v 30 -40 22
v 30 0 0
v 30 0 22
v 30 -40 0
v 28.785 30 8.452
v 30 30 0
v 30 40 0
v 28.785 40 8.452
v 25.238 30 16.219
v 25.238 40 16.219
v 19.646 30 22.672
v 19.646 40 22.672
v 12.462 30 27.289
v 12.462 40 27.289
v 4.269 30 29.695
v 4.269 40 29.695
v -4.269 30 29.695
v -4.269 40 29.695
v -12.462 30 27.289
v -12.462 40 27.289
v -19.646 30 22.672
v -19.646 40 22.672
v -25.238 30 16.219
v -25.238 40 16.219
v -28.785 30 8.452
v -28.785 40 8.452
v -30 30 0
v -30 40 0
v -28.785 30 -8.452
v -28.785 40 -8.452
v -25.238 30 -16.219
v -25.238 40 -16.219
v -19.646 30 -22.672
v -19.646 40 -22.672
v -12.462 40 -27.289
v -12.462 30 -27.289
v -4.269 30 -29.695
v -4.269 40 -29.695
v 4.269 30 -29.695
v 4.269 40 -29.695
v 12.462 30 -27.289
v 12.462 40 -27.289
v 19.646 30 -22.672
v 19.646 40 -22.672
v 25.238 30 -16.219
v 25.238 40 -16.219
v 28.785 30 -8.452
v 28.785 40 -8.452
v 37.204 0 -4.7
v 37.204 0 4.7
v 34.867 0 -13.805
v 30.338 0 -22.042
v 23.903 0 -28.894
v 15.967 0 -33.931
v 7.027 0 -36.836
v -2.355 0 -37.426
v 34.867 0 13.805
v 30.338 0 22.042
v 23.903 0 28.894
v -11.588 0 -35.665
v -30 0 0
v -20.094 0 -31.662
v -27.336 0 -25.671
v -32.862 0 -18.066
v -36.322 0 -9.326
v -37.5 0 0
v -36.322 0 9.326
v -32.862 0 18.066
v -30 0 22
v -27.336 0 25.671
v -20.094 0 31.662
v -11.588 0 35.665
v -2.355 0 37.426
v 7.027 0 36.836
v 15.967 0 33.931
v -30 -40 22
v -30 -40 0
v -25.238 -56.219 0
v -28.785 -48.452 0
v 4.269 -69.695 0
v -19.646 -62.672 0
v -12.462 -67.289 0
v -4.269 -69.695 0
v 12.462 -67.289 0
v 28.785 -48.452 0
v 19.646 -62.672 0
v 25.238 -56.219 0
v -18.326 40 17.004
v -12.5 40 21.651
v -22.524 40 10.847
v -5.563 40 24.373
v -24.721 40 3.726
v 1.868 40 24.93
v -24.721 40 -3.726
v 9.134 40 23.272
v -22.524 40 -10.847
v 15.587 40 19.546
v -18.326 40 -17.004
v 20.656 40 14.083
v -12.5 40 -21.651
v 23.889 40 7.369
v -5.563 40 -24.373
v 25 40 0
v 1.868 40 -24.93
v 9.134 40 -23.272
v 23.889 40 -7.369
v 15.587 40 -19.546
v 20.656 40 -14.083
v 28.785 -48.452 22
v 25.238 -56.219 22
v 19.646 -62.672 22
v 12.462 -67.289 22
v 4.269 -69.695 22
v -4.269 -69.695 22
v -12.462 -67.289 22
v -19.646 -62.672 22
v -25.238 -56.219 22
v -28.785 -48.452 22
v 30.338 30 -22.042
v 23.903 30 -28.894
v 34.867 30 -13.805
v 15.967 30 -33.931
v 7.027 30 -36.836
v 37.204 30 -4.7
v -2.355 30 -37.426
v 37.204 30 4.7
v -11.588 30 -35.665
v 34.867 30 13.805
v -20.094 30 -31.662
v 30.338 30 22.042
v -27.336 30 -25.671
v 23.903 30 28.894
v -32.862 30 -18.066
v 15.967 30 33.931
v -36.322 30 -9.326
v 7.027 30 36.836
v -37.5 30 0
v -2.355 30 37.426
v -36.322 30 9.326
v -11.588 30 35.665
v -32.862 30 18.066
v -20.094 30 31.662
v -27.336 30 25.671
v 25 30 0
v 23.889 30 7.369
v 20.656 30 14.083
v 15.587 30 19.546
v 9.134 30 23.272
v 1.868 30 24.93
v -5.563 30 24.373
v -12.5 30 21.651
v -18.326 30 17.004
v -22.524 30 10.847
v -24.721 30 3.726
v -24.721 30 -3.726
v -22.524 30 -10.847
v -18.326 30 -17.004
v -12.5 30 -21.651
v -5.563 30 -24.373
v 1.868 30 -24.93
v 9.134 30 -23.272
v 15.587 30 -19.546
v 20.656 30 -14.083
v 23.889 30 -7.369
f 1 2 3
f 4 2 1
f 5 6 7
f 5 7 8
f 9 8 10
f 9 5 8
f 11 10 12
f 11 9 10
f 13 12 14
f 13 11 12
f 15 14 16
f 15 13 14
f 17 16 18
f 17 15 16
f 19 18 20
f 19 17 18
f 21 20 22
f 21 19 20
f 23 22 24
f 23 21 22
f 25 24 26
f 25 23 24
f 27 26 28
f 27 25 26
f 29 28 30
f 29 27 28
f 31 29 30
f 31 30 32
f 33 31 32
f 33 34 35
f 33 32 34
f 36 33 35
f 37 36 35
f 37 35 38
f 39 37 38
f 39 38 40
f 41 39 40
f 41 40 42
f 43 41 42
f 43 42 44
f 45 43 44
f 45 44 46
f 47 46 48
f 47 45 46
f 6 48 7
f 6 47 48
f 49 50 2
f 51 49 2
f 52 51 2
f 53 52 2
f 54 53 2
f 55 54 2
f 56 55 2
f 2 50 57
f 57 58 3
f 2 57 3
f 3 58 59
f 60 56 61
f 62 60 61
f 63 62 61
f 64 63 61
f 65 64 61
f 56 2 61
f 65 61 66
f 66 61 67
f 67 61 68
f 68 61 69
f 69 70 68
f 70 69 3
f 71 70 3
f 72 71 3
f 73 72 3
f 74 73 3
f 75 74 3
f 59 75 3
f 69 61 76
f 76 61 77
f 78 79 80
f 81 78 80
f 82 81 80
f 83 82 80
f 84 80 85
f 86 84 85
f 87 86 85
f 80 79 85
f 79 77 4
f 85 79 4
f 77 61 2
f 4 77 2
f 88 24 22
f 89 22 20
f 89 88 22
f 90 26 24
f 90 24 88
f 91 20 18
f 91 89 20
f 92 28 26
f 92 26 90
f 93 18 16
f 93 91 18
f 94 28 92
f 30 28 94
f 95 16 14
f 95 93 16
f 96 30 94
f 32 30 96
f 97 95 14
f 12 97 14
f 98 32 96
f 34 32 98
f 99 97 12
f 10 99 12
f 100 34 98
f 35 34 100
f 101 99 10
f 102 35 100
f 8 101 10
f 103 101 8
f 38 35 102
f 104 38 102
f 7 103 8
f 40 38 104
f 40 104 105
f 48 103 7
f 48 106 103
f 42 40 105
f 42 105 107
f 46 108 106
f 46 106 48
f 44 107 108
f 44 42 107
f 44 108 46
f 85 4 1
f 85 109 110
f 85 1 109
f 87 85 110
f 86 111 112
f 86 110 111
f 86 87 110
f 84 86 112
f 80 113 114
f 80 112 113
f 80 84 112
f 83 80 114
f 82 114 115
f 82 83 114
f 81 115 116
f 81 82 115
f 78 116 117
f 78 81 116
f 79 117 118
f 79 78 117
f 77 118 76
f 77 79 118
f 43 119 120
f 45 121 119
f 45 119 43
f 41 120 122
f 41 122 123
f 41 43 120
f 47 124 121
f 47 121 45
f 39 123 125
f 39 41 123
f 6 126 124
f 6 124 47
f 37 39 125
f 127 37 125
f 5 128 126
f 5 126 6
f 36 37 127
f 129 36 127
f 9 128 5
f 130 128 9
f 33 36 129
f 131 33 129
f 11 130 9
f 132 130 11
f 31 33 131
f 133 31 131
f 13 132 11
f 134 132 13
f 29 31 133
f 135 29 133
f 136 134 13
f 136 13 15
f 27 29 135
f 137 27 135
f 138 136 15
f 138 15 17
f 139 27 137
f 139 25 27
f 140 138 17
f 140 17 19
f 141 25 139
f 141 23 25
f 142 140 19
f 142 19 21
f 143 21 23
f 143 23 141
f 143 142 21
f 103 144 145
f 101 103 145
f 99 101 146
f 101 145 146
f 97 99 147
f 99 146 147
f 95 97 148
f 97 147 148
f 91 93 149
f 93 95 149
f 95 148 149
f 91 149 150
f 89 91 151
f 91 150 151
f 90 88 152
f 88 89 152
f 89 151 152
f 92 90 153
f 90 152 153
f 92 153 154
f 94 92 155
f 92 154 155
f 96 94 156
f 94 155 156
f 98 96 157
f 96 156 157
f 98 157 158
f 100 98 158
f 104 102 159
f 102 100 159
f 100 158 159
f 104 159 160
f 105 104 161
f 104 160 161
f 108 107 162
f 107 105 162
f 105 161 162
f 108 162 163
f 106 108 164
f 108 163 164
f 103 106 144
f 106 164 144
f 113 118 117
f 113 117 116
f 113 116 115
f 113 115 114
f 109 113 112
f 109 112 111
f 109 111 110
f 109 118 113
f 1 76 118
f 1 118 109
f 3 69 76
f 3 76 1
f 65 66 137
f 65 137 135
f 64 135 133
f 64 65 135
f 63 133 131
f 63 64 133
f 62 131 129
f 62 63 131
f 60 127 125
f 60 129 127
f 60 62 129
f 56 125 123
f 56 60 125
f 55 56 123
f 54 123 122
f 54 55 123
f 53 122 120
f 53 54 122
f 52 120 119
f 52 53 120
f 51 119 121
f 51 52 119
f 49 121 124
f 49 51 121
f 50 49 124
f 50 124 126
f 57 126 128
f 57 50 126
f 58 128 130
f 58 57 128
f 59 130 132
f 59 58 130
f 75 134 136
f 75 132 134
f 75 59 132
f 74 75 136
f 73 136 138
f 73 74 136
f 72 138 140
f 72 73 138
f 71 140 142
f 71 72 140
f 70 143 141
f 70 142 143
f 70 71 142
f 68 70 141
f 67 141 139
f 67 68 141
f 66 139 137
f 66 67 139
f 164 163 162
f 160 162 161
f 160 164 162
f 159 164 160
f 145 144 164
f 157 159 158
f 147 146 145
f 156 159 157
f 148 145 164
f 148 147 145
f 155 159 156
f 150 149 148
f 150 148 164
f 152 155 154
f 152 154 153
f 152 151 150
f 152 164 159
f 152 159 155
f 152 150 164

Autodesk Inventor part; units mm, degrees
ref_plane "YZ Plane" through (0, 0, 0) normal (1, 0, 0) x (0, 1, 0)
ref_plane "XZ Plane" through (0, 0, 0) normal (0, 1, 0) x (-1, 0, 0)
ref_plane "XY Plane" through (0, 0, 0) normal (0, 0, 1) x (1, 0, 0)
sketch "Sketch1" plane through (0, 0, 0) normal (0, 1, 0) x (-1, 0, 0)
  circle A0 centre (0, 0) radius 37.5
  dimension "d0" = 75
extrude "Extrusion1" add sketch "Sketch1" along normal blind 30
sketch "Sketch6" plane through (0, 30, 0) normal (0, 1, 0) x (1, 0, 0)
  circle A0 centre (0, 0) radius 30
  circle A1 centre (0, 0) radius 25
  circle A2 centre (0, 0) radius 7.5
  dimension "d16" = 60
  dimension "d17" = 50
  dimension "d28" = 15
extrude "Extrusion5" add sketch "Sketch6" along normal blind 10 contours A0
sketch "Sketch9" plane through (0, 0, 0) normal (0, 0, 1) x (1, 0, 0)
  line L0 (0, 0) -> (30, 0)
  line L1 (30, 0) -> (30, -40)
  line L2 (30, -40) -> (0, -40)
  line L3 (0, -40) -> (0, 0)
  circle A0 centre (0, -40) radius 30
  line L4 (-30, 0) -> (-30, -40)
  line L5 (0, 0) -> (-30, 0)
  line L6 (37.5, 30) -> (-37.5, 30) projected
  point P0 (-30, -40)
  point P1 (30, -40)
  dimension "d38" = 40
  dimension "d40" = 60
  dimension "d41" = 30
  dimension "d44" = 0
extrude "Extrusion8" add sketch "Sketch9" along normal blind 22
properties part number "Shoulder1"
